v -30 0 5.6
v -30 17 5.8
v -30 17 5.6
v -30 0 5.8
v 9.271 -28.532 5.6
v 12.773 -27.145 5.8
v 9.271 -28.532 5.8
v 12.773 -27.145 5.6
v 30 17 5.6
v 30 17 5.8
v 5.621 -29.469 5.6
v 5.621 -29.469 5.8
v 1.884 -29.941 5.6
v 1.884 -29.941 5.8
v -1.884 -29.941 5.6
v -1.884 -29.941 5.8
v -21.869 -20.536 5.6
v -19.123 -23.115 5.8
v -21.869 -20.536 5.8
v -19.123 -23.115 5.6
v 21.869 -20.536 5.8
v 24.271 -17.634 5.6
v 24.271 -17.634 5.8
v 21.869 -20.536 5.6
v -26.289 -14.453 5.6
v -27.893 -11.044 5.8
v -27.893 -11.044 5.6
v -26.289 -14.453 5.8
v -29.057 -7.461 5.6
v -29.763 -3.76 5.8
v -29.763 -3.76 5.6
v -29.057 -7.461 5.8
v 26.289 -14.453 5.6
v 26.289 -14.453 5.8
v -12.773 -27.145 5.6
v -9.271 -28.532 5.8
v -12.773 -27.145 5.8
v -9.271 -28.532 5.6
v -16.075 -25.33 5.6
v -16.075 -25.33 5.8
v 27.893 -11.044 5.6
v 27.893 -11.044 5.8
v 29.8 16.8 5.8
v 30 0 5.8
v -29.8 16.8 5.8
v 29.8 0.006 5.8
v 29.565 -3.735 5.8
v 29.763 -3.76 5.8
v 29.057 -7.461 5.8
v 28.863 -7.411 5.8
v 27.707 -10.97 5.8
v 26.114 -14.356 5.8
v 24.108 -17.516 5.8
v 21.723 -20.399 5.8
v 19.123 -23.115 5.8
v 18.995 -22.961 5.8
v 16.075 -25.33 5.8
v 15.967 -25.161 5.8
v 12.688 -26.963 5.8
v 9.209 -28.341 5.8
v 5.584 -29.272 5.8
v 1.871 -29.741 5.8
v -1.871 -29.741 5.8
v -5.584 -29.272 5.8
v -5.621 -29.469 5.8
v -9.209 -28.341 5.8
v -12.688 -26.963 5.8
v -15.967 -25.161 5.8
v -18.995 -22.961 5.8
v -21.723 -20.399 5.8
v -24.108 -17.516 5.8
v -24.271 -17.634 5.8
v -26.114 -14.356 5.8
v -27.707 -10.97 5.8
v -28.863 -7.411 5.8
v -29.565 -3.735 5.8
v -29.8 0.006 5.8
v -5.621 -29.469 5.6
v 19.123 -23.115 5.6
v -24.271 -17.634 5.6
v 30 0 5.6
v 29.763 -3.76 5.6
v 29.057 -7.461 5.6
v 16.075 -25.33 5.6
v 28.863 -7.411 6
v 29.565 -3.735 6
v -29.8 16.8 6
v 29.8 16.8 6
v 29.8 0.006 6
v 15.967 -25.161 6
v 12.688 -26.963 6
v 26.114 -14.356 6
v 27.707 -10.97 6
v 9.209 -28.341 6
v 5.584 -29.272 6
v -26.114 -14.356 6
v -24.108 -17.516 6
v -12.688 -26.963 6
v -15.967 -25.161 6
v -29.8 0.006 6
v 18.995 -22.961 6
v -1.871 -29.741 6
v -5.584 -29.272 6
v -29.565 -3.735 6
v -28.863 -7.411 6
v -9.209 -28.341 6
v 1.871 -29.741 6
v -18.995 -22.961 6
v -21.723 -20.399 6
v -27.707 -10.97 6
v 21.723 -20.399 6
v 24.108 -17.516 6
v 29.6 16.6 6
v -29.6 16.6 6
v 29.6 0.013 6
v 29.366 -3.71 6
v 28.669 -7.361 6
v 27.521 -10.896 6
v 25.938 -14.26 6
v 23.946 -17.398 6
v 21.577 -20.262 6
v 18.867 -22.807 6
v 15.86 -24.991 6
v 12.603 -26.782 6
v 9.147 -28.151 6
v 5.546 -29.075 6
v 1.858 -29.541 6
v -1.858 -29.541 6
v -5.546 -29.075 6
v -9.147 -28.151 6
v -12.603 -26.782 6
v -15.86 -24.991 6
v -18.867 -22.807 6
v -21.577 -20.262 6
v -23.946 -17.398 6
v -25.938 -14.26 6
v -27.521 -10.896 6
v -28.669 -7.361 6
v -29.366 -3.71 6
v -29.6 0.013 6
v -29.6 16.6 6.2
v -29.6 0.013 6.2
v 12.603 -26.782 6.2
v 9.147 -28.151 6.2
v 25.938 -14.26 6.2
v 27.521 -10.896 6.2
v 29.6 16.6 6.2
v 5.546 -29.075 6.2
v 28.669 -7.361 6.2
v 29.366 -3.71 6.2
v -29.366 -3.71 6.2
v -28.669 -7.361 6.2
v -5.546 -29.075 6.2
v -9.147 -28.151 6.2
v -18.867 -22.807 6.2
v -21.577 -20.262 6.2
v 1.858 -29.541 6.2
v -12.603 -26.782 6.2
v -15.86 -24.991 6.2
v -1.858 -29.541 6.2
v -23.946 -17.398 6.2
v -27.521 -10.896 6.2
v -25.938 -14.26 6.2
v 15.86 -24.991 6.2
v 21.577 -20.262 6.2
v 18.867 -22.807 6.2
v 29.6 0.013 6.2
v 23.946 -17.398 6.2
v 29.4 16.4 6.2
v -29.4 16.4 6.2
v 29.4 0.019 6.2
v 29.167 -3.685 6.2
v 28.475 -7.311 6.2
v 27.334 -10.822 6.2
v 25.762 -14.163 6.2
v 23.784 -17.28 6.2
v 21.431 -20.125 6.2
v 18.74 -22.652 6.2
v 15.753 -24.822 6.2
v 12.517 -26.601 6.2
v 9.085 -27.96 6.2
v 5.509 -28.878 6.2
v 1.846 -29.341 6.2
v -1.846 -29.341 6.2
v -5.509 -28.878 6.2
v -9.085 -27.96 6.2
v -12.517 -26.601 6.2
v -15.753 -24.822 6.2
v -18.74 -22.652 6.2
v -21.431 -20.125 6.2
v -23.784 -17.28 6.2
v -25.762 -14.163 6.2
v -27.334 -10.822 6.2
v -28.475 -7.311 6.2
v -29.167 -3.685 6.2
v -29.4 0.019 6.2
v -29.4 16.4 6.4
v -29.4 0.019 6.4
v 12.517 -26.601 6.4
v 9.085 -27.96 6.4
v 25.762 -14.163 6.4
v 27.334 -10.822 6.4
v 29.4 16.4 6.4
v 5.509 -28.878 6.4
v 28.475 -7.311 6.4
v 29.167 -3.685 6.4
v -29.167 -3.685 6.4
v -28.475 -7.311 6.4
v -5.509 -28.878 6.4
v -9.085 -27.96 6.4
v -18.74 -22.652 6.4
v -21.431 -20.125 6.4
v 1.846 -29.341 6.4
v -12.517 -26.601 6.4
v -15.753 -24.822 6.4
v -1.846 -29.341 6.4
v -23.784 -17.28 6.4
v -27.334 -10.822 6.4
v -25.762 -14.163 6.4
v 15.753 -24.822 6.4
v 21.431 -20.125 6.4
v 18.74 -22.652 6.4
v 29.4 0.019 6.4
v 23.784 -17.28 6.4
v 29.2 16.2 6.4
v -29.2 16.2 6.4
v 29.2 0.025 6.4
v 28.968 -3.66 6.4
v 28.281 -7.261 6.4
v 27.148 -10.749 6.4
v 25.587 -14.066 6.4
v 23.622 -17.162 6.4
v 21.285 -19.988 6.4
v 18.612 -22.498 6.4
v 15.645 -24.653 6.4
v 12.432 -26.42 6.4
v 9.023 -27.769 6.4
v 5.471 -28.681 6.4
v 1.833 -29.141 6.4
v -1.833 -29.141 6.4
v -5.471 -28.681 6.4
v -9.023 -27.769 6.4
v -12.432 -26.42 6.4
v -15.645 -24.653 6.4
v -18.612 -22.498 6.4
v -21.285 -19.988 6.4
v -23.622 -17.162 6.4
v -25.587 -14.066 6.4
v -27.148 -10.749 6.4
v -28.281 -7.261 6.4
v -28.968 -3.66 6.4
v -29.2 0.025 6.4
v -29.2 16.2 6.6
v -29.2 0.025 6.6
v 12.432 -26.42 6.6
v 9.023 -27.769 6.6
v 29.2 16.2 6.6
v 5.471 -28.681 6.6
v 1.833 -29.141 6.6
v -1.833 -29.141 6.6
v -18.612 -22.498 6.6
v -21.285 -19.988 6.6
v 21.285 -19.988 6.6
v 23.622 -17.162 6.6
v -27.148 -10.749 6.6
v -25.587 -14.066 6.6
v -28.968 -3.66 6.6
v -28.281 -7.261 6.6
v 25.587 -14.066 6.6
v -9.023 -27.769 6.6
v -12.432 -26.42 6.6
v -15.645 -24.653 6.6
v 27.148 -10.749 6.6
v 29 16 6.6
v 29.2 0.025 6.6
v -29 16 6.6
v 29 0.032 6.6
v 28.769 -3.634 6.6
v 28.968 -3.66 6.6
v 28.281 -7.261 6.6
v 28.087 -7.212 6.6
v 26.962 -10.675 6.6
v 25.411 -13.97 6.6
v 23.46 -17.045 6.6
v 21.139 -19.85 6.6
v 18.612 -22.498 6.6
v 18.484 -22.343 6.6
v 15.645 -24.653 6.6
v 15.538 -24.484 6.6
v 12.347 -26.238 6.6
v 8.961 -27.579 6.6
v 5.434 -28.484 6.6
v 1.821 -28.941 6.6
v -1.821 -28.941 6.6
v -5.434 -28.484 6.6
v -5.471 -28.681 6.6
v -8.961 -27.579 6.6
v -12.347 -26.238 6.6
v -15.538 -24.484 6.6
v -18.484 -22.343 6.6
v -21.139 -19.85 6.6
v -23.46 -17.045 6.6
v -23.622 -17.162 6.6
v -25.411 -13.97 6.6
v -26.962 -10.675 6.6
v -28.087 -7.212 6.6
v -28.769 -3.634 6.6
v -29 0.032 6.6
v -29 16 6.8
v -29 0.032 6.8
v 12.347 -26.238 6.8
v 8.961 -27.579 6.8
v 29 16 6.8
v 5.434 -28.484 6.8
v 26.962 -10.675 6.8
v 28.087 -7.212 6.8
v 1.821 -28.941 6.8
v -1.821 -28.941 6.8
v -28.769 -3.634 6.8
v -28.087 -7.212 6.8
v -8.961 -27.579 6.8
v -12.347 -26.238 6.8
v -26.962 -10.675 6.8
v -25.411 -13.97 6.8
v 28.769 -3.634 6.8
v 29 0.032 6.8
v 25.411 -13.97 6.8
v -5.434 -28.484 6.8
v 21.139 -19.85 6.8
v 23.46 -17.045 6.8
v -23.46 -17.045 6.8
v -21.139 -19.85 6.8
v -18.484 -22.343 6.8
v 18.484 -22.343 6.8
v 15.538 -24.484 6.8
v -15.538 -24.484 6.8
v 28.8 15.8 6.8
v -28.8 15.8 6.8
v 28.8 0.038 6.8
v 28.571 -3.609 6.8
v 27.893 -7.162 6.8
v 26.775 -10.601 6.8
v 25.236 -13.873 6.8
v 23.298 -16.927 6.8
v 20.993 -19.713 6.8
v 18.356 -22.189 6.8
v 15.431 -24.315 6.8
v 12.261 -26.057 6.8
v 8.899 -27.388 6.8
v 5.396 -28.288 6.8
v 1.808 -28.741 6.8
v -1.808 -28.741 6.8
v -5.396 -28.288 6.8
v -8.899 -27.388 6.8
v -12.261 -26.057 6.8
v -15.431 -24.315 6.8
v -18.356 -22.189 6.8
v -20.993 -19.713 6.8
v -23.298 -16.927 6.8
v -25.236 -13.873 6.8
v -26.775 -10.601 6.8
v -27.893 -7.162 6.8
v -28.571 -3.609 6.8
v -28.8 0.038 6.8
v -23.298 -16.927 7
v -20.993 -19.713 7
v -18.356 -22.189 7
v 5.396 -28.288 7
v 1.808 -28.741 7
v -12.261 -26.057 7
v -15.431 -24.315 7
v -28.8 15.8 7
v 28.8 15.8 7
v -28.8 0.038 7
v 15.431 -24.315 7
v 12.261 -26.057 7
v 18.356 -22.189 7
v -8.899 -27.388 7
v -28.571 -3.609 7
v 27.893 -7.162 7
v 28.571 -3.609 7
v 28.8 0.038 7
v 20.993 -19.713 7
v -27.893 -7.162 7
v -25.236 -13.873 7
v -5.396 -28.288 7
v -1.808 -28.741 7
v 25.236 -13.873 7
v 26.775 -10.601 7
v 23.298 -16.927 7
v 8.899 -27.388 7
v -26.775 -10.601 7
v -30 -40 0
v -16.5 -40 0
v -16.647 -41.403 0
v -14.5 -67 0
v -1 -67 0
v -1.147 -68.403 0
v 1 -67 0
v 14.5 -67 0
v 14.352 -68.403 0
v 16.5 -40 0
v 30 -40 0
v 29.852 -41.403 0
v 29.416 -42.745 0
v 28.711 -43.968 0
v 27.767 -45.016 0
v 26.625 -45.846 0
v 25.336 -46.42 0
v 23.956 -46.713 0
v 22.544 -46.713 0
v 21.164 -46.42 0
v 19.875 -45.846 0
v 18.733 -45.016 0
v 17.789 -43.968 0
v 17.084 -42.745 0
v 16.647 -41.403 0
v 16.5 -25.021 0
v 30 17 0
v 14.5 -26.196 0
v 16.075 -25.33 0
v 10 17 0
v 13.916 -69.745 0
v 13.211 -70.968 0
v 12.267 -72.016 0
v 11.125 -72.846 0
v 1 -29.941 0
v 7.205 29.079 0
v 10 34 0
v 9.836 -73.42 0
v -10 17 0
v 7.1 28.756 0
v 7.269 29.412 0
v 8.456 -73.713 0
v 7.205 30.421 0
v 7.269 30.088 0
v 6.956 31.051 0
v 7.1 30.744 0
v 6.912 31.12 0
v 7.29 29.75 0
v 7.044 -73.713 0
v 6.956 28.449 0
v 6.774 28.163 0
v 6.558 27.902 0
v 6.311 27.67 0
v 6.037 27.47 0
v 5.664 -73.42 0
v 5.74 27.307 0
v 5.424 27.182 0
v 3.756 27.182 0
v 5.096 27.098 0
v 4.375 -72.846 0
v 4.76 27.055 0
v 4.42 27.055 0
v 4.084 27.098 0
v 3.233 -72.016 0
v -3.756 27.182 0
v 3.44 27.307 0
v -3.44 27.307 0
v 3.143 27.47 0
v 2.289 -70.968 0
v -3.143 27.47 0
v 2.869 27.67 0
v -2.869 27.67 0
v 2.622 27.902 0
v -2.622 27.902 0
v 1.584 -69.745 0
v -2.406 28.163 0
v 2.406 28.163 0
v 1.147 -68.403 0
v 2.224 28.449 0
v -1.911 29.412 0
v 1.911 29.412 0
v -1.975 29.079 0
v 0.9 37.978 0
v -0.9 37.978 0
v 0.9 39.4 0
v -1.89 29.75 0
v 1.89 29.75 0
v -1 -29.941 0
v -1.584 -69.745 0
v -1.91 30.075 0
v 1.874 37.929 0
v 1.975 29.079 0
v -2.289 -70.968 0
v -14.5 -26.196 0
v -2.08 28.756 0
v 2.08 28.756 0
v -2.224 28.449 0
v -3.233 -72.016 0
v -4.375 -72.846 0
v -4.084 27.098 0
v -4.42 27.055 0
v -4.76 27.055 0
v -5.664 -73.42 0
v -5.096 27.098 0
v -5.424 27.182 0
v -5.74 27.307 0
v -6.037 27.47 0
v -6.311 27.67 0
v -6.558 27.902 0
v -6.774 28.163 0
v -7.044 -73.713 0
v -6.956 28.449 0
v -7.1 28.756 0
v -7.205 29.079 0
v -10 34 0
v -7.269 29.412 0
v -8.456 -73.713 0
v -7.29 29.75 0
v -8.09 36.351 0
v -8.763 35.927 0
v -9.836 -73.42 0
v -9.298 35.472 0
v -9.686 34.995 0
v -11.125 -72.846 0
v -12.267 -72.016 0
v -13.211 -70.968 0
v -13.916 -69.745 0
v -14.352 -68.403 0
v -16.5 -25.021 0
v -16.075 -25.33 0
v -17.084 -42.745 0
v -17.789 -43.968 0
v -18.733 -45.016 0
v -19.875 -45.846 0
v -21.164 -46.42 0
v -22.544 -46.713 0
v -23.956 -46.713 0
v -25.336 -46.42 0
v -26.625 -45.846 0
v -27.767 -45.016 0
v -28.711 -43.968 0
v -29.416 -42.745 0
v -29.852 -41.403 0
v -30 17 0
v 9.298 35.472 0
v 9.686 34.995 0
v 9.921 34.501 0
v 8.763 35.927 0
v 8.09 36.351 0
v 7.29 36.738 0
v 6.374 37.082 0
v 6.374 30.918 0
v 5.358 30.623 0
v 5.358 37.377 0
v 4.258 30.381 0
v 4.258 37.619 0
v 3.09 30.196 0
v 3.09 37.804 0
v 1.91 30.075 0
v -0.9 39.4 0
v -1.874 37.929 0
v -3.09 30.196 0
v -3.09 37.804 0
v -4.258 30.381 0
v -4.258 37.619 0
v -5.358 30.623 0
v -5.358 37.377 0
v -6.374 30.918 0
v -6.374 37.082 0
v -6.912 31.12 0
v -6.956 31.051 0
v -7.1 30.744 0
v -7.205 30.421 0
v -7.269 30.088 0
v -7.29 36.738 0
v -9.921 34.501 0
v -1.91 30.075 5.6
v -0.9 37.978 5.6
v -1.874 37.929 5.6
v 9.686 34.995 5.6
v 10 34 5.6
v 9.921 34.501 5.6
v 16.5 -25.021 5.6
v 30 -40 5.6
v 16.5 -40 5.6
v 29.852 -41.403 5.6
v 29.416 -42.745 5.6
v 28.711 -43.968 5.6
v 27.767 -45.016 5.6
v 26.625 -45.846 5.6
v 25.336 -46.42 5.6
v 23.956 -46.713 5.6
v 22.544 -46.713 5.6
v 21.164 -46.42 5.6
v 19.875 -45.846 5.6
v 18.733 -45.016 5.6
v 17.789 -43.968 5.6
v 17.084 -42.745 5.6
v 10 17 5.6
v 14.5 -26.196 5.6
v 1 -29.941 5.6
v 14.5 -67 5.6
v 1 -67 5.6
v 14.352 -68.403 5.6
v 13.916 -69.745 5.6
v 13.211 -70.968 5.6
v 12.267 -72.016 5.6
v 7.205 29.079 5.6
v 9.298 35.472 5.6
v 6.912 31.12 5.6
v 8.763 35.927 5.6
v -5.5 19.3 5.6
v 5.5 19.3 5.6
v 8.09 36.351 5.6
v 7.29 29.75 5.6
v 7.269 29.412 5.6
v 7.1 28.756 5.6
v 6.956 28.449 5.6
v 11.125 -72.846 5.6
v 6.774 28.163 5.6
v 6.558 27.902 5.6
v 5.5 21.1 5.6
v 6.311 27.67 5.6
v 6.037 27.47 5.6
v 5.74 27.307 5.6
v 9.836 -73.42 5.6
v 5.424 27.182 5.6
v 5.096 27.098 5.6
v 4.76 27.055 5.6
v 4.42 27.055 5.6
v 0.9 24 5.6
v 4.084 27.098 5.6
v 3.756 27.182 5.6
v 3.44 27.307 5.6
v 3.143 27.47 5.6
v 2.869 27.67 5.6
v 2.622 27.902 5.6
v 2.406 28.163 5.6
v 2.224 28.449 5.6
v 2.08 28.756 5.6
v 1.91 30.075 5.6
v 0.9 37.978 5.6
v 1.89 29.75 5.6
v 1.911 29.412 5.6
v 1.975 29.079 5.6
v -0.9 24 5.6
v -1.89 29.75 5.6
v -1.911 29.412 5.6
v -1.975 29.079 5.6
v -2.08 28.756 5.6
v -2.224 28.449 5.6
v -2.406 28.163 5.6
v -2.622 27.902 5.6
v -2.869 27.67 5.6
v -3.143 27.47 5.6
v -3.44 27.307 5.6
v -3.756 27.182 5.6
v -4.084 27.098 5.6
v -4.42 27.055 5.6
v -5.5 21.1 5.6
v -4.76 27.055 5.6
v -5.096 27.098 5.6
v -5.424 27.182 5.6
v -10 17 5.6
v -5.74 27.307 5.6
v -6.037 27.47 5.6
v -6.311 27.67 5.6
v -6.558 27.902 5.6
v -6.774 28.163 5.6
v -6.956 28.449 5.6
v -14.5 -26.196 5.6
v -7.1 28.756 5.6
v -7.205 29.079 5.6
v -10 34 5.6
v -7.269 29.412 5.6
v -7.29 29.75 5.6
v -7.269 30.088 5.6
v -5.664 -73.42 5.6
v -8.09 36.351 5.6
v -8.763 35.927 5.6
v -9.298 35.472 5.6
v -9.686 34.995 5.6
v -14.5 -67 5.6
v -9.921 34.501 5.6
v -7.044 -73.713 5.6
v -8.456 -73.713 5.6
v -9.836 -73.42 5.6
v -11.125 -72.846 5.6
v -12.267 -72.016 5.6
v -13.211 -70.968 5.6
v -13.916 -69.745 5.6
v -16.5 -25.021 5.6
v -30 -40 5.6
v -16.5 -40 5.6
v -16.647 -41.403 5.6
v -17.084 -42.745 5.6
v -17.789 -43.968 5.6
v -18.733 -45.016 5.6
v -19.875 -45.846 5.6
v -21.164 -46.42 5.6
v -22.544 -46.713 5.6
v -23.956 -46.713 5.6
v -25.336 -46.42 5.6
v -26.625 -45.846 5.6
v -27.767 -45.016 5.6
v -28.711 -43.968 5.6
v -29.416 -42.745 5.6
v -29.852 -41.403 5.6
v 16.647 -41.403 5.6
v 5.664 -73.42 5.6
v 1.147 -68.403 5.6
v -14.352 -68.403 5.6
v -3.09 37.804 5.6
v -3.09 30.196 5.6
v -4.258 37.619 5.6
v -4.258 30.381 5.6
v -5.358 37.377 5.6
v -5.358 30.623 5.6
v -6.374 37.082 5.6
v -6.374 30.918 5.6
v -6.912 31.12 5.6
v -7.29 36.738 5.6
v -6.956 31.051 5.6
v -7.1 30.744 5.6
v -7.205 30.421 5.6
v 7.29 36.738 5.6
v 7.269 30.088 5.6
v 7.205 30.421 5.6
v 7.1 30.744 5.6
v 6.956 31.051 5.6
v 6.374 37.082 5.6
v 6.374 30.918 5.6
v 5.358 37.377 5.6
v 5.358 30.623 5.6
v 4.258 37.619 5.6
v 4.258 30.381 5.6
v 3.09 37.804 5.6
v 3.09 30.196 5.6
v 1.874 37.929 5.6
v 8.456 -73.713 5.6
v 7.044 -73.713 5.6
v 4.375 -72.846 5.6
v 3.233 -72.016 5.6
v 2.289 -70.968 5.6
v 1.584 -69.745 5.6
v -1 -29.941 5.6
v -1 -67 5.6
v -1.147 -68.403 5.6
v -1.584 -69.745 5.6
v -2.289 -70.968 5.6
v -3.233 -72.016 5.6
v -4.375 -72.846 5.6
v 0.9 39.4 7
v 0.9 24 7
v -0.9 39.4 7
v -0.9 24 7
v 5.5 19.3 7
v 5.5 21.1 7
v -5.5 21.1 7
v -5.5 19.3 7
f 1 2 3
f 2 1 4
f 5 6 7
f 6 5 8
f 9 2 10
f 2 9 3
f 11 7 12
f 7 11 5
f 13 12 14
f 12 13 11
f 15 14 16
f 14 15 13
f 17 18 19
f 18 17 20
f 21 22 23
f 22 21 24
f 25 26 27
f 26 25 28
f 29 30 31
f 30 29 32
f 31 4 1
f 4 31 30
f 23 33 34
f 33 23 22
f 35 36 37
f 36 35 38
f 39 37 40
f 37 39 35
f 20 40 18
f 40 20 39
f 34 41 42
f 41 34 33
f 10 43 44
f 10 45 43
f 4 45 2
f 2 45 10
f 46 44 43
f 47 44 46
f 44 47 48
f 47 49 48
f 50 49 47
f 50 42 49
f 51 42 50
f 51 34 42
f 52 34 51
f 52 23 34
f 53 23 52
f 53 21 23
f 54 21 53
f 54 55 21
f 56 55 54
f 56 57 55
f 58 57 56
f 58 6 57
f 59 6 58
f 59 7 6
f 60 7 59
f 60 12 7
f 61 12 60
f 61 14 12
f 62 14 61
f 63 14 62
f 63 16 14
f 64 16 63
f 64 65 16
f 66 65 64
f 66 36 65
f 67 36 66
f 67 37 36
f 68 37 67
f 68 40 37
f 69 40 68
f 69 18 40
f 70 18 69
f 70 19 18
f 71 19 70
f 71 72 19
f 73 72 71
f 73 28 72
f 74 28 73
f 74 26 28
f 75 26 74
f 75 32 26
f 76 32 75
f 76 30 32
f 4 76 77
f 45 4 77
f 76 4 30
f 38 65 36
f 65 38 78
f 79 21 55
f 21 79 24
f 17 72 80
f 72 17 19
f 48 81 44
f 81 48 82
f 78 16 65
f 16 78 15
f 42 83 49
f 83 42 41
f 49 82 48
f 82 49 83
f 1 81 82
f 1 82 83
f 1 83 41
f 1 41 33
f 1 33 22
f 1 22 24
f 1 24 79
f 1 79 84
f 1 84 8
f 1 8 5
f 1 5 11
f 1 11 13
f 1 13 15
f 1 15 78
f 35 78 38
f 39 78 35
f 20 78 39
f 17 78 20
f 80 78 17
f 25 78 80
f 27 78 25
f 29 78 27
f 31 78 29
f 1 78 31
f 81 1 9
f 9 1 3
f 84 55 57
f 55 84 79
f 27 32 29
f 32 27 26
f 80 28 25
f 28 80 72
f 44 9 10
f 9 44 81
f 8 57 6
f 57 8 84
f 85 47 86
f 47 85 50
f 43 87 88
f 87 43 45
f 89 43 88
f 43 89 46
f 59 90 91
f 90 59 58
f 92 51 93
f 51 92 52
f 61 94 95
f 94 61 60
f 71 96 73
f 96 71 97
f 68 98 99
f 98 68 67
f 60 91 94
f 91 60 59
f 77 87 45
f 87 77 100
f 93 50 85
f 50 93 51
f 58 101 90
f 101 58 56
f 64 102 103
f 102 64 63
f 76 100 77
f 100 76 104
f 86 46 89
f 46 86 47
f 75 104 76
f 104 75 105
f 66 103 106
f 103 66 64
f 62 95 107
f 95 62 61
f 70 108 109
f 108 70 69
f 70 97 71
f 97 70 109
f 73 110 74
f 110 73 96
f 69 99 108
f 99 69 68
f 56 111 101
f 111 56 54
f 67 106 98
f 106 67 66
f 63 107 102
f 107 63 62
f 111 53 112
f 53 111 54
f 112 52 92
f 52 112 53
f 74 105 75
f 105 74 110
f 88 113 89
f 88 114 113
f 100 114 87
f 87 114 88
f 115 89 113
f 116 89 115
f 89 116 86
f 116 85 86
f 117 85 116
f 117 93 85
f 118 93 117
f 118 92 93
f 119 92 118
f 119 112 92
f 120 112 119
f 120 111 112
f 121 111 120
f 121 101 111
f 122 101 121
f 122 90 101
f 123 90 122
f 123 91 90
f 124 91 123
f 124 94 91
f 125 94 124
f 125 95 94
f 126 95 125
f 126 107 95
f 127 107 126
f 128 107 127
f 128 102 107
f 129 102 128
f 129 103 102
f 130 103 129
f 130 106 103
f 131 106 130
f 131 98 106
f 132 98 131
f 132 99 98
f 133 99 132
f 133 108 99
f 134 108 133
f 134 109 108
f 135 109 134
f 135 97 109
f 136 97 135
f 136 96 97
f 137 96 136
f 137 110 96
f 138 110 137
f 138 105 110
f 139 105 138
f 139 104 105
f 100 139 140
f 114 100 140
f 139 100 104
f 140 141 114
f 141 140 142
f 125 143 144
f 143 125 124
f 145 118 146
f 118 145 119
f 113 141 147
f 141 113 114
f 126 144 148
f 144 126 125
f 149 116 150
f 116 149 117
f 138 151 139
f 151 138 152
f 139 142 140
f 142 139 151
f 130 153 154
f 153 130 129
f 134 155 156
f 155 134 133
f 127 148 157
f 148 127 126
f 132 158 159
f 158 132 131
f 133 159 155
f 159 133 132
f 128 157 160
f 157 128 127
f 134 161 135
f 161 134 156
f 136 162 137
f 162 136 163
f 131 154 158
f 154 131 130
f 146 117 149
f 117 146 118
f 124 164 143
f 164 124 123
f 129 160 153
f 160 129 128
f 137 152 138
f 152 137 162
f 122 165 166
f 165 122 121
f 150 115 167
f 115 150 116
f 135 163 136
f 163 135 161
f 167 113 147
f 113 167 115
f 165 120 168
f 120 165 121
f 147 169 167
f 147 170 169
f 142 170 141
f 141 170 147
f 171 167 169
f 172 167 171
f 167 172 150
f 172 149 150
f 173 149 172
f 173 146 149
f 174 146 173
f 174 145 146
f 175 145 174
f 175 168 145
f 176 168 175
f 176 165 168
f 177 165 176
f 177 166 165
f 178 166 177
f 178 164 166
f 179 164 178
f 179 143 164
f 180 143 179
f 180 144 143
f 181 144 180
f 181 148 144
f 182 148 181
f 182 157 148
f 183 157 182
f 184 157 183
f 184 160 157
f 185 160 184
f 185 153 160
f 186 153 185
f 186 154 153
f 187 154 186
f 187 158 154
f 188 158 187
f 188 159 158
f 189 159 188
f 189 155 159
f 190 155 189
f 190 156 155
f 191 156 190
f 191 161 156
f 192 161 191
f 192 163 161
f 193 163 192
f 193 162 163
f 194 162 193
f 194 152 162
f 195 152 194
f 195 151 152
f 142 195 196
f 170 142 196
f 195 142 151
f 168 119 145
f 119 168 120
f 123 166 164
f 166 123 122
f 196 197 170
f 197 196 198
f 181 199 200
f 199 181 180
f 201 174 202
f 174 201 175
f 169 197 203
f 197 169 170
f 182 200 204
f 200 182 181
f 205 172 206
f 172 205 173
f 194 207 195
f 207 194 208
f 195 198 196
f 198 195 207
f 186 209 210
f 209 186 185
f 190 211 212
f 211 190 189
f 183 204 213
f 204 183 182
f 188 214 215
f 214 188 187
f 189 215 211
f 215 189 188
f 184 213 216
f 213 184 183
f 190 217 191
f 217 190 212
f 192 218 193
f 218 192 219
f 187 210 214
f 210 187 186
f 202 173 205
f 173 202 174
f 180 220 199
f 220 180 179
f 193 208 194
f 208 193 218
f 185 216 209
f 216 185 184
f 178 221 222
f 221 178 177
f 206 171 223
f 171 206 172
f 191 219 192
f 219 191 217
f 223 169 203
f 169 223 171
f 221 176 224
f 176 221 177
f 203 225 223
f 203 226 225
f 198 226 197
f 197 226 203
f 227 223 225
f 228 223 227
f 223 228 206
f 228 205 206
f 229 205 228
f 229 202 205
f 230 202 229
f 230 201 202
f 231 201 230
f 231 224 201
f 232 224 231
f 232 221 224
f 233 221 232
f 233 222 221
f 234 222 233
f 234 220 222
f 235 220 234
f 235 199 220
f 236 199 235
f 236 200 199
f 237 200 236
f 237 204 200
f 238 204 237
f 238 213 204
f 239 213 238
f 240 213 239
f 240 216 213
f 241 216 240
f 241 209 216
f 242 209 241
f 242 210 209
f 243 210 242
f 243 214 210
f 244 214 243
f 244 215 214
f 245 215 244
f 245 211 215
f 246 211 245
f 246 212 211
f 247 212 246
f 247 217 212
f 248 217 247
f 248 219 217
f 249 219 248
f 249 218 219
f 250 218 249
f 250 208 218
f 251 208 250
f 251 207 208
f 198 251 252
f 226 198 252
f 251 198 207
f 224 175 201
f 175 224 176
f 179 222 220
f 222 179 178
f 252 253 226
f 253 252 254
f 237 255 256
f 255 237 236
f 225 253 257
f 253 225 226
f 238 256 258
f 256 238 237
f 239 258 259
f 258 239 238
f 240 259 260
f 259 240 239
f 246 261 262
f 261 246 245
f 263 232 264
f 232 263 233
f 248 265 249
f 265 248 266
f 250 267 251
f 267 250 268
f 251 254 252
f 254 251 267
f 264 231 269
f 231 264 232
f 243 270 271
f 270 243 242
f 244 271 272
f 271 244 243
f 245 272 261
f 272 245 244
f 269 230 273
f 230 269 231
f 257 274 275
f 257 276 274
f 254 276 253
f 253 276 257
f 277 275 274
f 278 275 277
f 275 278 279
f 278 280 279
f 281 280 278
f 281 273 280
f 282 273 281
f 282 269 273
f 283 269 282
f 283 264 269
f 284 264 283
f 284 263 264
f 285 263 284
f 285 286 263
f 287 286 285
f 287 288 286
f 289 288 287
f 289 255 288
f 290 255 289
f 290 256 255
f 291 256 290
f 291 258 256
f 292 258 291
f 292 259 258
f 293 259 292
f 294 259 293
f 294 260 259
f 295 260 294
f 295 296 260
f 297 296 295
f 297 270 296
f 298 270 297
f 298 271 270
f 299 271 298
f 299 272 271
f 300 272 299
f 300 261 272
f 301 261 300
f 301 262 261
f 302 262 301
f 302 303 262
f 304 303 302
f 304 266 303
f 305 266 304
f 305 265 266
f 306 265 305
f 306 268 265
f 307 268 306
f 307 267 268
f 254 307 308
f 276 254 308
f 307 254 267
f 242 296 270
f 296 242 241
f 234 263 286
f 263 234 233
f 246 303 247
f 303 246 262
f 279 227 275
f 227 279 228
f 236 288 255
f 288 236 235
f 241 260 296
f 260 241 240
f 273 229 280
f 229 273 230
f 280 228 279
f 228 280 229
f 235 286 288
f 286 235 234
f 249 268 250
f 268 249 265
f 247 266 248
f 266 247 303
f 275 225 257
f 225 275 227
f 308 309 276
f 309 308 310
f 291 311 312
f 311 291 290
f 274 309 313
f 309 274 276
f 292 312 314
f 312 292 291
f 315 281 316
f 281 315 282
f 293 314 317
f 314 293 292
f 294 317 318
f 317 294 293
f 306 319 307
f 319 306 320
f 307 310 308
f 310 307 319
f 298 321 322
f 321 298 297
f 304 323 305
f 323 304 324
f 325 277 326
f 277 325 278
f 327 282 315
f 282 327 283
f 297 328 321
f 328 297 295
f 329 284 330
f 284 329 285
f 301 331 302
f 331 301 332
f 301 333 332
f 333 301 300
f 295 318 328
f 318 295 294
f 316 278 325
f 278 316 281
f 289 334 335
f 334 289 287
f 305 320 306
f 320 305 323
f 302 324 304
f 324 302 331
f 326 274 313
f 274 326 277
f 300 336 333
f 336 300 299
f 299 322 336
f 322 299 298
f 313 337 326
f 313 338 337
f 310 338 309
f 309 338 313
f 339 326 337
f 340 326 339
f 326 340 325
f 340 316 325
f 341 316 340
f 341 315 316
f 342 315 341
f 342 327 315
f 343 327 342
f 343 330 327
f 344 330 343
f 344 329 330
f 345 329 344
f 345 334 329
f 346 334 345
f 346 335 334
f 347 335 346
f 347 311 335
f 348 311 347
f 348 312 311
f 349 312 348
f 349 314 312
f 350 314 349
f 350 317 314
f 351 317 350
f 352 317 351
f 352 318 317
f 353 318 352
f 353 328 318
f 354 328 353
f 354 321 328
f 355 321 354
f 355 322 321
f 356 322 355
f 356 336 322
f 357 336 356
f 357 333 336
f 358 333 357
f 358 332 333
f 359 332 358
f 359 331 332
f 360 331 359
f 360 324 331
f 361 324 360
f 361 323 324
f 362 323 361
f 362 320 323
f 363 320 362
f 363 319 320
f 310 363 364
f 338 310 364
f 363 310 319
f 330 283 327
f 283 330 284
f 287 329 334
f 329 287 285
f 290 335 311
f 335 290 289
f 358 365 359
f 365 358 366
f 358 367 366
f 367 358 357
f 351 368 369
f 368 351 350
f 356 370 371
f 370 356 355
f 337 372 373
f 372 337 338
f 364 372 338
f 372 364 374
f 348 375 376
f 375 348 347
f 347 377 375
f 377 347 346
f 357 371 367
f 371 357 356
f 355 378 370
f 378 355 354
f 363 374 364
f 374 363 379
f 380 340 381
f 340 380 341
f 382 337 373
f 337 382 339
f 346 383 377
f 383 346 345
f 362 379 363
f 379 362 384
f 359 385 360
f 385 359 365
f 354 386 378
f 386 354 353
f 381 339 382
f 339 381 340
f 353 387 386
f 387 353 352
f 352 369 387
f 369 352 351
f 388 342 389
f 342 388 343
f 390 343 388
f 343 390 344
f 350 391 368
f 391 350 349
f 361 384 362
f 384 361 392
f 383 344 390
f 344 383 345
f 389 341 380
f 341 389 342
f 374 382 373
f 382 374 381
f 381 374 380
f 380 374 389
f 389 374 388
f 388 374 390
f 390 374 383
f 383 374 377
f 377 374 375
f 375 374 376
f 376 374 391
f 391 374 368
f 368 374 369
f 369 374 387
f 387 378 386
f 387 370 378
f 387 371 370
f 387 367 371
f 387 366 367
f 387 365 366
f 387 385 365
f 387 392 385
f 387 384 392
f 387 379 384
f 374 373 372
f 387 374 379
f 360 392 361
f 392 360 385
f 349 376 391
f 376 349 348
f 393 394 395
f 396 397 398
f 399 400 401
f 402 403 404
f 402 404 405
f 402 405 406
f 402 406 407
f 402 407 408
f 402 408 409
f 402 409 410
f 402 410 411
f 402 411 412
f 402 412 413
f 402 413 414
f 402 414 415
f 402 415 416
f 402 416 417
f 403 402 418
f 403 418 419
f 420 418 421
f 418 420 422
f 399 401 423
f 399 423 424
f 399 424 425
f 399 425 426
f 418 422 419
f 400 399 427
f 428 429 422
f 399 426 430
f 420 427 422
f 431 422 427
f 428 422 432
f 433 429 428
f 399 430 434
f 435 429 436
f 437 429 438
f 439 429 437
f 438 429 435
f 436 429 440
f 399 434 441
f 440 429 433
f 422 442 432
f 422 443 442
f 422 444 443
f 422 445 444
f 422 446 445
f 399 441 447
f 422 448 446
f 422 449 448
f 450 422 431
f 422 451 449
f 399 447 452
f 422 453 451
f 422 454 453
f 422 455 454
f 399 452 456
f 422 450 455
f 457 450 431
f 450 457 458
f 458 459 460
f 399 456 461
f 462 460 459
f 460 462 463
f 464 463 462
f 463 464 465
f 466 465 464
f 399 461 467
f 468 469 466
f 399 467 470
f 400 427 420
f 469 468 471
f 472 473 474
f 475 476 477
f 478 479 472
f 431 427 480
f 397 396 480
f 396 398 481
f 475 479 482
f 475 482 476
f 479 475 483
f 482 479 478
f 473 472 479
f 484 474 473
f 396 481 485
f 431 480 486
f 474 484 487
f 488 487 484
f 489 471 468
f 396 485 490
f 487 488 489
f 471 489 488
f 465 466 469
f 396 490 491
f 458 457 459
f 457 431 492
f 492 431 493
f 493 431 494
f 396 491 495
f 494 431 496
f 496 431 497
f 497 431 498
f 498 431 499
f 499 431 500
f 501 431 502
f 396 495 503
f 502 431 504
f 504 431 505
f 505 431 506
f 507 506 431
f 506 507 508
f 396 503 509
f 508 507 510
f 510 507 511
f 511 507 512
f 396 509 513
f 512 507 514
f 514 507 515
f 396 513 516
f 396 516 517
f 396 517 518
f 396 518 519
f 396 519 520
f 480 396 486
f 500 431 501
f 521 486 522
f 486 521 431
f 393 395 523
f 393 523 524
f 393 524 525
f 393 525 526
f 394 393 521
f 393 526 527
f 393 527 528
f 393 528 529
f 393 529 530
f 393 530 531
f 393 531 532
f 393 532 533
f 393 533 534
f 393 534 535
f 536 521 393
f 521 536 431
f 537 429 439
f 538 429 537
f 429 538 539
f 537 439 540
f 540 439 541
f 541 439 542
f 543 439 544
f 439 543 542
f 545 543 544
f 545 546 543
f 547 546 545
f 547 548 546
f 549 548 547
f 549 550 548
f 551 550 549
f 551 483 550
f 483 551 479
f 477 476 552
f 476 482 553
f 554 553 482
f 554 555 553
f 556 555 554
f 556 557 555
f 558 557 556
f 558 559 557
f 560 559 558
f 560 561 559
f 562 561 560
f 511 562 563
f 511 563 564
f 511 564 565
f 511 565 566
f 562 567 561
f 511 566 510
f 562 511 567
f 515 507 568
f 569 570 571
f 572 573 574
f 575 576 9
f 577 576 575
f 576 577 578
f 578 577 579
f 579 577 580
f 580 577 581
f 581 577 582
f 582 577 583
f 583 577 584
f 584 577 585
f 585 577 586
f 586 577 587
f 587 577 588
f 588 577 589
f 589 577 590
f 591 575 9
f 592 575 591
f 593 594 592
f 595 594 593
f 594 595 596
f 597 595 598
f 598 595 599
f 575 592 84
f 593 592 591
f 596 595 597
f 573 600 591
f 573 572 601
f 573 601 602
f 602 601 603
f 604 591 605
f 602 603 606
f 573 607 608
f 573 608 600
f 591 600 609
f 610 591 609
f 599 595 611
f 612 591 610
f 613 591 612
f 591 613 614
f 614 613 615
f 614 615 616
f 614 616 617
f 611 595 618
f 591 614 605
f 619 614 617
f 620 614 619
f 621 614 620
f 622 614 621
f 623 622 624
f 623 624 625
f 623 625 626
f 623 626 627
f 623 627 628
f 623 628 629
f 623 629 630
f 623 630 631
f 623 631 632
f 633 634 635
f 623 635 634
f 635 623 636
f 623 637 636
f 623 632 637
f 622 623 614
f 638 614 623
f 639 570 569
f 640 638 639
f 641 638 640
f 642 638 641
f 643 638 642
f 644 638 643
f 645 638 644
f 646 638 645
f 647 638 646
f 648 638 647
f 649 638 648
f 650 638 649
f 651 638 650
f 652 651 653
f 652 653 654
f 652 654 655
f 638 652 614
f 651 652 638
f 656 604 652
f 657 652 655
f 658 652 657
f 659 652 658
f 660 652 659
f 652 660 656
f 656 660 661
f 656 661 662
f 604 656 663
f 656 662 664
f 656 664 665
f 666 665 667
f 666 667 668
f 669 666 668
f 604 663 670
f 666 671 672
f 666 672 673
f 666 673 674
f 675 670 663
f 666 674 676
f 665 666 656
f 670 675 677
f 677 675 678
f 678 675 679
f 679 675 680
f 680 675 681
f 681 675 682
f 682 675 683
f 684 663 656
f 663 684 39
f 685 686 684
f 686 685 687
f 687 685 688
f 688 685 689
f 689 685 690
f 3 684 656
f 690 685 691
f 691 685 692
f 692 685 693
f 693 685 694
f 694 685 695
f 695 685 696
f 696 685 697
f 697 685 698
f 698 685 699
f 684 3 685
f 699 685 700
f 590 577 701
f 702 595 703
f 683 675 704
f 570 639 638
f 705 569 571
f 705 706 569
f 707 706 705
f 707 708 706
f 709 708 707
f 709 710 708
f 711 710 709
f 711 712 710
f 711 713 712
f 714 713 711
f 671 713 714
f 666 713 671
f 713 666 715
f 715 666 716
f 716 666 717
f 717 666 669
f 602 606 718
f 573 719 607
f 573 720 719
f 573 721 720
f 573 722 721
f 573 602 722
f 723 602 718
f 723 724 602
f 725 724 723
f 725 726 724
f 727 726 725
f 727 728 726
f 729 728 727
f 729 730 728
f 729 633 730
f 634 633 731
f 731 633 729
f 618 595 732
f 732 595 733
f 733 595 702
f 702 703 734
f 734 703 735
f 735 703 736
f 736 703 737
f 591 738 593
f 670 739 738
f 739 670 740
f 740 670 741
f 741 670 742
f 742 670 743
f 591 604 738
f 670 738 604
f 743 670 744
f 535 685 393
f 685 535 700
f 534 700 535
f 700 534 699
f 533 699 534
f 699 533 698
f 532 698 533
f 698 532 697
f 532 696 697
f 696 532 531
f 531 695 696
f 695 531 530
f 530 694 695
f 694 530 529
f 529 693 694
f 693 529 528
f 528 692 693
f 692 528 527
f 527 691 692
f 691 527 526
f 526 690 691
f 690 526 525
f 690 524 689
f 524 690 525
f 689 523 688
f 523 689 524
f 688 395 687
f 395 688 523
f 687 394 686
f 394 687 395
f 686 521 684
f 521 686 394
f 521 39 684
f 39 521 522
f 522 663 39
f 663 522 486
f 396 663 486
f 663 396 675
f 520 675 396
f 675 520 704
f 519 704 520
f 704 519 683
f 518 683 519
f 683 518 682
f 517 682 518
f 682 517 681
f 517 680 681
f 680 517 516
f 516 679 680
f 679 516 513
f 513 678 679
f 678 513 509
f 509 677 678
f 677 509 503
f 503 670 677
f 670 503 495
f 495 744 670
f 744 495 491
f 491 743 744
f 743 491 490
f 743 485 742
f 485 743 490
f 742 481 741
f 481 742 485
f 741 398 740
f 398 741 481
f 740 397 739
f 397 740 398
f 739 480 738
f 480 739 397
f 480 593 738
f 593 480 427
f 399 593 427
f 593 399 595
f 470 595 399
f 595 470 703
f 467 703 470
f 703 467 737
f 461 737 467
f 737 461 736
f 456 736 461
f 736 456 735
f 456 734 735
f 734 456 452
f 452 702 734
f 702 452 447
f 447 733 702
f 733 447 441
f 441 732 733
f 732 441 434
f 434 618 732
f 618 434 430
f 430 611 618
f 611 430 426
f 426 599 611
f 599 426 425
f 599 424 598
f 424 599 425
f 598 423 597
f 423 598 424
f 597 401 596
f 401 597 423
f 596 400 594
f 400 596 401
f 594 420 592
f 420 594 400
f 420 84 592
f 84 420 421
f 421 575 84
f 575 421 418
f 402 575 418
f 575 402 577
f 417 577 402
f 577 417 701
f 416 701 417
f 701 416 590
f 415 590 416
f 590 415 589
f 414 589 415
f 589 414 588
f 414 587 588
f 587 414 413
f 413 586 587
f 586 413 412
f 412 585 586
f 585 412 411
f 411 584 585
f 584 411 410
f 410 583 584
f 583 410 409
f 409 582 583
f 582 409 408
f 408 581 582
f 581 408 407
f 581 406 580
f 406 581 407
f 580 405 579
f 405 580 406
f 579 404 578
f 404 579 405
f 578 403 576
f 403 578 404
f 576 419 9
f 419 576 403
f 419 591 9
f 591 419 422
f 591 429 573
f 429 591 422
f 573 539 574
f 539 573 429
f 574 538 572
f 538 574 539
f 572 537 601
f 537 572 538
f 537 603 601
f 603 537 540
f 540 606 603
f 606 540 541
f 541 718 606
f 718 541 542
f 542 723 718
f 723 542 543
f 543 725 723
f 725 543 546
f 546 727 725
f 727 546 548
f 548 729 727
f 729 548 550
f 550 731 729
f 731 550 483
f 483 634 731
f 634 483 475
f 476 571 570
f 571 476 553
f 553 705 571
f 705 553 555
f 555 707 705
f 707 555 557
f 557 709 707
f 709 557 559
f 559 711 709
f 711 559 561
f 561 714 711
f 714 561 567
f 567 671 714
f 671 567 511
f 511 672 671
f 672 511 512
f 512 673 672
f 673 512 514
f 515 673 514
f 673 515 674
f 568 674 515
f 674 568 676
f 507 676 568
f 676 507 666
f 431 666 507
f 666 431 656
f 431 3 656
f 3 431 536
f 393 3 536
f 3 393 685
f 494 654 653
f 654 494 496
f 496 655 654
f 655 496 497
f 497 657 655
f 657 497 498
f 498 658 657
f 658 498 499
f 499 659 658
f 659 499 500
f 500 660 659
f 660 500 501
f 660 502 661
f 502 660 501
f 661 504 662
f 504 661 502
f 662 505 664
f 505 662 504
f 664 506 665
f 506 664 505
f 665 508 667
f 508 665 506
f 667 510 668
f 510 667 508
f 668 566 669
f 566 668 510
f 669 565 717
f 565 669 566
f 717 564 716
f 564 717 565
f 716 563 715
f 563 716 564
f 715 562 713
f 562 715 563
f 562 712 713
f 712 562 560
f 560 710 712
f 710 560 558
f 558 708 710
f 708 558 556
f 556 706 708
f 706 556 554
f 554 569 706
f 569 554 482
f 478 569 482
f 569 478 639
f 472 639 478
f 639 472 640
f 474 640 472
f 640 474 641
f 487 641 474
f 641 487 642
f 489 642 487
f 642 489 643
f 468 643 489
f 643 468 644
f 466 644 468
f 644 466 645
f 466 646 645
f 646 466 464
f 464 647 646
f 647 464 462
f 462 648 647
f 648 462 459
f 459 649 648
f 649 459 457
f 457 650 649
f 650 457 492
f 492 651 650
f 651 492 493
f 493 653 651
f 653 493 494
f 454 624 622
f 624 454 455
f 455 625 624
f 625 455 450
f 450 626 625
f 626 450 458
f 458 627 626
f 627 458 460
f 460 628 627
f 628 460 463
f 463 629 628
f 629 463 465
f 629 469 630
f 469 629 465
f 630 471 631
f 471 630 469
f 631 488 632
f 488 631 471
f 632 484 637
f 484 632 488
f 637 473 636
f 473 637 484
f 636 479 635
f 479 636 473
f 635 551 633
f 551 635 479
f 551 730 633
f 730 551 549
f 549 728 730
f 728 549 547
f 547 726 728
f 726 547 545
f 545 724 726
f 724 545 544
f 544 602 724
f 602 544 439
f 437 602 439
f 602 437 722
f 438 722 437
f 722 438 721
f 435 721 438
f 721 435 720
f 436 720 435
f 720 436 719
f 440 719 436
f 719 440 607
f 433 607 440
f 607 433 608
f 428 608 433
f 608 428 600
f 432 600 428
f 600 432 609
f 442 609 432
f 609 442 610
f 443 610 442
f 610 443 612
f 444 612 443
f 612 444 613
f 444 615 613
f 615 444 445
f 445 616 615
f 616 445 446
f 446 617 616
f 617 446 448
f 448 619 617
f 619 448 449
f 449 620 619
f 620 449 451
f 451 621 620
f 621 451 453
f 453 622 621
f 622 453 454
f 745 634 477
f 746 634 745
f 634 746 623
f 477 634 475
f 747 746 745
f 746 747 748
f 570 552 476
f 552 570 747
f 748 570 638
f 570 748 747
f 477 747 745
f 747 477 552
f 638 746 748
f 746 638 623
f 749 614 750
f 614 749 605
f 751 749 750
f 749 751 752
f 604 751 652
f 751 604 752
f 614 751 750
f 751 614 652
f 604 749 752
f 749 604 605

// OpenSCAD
// Roz is 48.5mm across the shoulders.
width = 60;
shoulder_height = 17; 
arm_spacing = 2;
arm_width = (width - 3*arm_spacing)/4;
arm_length = 40;
leg_length = 67;
head_width = 20;
head_height = 17;
eye = 5.4;

module torso_2d() {
  $fn = 50;
  intersection() {
    circle(d=width);
    translate([-width/2, -width]) square(width);
  }
  translate([-width/2, 0]) square([width, shoulder_height]);
}

module arms_2d() {
  $fn = 30;
  for (a = [-1, 1]) {
    scale([a, 1]) {
      translate([width/2-arm_width, -arm_length]) {
        square([arm_width, arm_length]);
        translate([arm_width/2, 0])
          circle(d=arm_width);
      }
    }
  }
}

module legs_2d() {
  $fn = 30;
  for (a = [-1, 1]) {
    scale([a, 1]) {
      translate([arm_spacing/2, -leg_length]) {
        square([arm_width, leg_length]);
        translate([arm_width/2, 0])
          circle(d=arm_width);
      }
    }
  }
}

module head_2d() {
  $fn = 50;
  difference() {
    translate([-head_width/2, shoulder_height])
      square([head_width, head_height]);
    for (a = [-1, 1])
      scale([a, 1])
        translate([eye*0.85, shoulder_height + head_height*0.75])
          circle(d=eye);
  }
  // Dome.
  translate([0, shoulder_height + head_height])
    scale([1, 0.4])
      circle(d=head_width);
}

module reco() {
  linear_extrude(5.6) {
    torso_2d();
    arms_2d();
    legs_2d();
    head_2d();
  }
  translate([0, 0, 5.6])
    for (i = [0:6])
      translate([0, 0, i*0.2])
        linear_extrude(0.2001)
          offset(-i*0.2)
            torso_2d();

  // Crest.
  crest_width = 1.8;
  translate([-crest_width/2, shoulder_height + 7, 0])
    cube([crest_width, 15.4, 7]);
  mouth_width = head_width*0.55;
  translate([-mouth_width/2, shoulder_height + 2.3, 0])
    cube([mouth_width, crest_width, 7]);
}

reco();
